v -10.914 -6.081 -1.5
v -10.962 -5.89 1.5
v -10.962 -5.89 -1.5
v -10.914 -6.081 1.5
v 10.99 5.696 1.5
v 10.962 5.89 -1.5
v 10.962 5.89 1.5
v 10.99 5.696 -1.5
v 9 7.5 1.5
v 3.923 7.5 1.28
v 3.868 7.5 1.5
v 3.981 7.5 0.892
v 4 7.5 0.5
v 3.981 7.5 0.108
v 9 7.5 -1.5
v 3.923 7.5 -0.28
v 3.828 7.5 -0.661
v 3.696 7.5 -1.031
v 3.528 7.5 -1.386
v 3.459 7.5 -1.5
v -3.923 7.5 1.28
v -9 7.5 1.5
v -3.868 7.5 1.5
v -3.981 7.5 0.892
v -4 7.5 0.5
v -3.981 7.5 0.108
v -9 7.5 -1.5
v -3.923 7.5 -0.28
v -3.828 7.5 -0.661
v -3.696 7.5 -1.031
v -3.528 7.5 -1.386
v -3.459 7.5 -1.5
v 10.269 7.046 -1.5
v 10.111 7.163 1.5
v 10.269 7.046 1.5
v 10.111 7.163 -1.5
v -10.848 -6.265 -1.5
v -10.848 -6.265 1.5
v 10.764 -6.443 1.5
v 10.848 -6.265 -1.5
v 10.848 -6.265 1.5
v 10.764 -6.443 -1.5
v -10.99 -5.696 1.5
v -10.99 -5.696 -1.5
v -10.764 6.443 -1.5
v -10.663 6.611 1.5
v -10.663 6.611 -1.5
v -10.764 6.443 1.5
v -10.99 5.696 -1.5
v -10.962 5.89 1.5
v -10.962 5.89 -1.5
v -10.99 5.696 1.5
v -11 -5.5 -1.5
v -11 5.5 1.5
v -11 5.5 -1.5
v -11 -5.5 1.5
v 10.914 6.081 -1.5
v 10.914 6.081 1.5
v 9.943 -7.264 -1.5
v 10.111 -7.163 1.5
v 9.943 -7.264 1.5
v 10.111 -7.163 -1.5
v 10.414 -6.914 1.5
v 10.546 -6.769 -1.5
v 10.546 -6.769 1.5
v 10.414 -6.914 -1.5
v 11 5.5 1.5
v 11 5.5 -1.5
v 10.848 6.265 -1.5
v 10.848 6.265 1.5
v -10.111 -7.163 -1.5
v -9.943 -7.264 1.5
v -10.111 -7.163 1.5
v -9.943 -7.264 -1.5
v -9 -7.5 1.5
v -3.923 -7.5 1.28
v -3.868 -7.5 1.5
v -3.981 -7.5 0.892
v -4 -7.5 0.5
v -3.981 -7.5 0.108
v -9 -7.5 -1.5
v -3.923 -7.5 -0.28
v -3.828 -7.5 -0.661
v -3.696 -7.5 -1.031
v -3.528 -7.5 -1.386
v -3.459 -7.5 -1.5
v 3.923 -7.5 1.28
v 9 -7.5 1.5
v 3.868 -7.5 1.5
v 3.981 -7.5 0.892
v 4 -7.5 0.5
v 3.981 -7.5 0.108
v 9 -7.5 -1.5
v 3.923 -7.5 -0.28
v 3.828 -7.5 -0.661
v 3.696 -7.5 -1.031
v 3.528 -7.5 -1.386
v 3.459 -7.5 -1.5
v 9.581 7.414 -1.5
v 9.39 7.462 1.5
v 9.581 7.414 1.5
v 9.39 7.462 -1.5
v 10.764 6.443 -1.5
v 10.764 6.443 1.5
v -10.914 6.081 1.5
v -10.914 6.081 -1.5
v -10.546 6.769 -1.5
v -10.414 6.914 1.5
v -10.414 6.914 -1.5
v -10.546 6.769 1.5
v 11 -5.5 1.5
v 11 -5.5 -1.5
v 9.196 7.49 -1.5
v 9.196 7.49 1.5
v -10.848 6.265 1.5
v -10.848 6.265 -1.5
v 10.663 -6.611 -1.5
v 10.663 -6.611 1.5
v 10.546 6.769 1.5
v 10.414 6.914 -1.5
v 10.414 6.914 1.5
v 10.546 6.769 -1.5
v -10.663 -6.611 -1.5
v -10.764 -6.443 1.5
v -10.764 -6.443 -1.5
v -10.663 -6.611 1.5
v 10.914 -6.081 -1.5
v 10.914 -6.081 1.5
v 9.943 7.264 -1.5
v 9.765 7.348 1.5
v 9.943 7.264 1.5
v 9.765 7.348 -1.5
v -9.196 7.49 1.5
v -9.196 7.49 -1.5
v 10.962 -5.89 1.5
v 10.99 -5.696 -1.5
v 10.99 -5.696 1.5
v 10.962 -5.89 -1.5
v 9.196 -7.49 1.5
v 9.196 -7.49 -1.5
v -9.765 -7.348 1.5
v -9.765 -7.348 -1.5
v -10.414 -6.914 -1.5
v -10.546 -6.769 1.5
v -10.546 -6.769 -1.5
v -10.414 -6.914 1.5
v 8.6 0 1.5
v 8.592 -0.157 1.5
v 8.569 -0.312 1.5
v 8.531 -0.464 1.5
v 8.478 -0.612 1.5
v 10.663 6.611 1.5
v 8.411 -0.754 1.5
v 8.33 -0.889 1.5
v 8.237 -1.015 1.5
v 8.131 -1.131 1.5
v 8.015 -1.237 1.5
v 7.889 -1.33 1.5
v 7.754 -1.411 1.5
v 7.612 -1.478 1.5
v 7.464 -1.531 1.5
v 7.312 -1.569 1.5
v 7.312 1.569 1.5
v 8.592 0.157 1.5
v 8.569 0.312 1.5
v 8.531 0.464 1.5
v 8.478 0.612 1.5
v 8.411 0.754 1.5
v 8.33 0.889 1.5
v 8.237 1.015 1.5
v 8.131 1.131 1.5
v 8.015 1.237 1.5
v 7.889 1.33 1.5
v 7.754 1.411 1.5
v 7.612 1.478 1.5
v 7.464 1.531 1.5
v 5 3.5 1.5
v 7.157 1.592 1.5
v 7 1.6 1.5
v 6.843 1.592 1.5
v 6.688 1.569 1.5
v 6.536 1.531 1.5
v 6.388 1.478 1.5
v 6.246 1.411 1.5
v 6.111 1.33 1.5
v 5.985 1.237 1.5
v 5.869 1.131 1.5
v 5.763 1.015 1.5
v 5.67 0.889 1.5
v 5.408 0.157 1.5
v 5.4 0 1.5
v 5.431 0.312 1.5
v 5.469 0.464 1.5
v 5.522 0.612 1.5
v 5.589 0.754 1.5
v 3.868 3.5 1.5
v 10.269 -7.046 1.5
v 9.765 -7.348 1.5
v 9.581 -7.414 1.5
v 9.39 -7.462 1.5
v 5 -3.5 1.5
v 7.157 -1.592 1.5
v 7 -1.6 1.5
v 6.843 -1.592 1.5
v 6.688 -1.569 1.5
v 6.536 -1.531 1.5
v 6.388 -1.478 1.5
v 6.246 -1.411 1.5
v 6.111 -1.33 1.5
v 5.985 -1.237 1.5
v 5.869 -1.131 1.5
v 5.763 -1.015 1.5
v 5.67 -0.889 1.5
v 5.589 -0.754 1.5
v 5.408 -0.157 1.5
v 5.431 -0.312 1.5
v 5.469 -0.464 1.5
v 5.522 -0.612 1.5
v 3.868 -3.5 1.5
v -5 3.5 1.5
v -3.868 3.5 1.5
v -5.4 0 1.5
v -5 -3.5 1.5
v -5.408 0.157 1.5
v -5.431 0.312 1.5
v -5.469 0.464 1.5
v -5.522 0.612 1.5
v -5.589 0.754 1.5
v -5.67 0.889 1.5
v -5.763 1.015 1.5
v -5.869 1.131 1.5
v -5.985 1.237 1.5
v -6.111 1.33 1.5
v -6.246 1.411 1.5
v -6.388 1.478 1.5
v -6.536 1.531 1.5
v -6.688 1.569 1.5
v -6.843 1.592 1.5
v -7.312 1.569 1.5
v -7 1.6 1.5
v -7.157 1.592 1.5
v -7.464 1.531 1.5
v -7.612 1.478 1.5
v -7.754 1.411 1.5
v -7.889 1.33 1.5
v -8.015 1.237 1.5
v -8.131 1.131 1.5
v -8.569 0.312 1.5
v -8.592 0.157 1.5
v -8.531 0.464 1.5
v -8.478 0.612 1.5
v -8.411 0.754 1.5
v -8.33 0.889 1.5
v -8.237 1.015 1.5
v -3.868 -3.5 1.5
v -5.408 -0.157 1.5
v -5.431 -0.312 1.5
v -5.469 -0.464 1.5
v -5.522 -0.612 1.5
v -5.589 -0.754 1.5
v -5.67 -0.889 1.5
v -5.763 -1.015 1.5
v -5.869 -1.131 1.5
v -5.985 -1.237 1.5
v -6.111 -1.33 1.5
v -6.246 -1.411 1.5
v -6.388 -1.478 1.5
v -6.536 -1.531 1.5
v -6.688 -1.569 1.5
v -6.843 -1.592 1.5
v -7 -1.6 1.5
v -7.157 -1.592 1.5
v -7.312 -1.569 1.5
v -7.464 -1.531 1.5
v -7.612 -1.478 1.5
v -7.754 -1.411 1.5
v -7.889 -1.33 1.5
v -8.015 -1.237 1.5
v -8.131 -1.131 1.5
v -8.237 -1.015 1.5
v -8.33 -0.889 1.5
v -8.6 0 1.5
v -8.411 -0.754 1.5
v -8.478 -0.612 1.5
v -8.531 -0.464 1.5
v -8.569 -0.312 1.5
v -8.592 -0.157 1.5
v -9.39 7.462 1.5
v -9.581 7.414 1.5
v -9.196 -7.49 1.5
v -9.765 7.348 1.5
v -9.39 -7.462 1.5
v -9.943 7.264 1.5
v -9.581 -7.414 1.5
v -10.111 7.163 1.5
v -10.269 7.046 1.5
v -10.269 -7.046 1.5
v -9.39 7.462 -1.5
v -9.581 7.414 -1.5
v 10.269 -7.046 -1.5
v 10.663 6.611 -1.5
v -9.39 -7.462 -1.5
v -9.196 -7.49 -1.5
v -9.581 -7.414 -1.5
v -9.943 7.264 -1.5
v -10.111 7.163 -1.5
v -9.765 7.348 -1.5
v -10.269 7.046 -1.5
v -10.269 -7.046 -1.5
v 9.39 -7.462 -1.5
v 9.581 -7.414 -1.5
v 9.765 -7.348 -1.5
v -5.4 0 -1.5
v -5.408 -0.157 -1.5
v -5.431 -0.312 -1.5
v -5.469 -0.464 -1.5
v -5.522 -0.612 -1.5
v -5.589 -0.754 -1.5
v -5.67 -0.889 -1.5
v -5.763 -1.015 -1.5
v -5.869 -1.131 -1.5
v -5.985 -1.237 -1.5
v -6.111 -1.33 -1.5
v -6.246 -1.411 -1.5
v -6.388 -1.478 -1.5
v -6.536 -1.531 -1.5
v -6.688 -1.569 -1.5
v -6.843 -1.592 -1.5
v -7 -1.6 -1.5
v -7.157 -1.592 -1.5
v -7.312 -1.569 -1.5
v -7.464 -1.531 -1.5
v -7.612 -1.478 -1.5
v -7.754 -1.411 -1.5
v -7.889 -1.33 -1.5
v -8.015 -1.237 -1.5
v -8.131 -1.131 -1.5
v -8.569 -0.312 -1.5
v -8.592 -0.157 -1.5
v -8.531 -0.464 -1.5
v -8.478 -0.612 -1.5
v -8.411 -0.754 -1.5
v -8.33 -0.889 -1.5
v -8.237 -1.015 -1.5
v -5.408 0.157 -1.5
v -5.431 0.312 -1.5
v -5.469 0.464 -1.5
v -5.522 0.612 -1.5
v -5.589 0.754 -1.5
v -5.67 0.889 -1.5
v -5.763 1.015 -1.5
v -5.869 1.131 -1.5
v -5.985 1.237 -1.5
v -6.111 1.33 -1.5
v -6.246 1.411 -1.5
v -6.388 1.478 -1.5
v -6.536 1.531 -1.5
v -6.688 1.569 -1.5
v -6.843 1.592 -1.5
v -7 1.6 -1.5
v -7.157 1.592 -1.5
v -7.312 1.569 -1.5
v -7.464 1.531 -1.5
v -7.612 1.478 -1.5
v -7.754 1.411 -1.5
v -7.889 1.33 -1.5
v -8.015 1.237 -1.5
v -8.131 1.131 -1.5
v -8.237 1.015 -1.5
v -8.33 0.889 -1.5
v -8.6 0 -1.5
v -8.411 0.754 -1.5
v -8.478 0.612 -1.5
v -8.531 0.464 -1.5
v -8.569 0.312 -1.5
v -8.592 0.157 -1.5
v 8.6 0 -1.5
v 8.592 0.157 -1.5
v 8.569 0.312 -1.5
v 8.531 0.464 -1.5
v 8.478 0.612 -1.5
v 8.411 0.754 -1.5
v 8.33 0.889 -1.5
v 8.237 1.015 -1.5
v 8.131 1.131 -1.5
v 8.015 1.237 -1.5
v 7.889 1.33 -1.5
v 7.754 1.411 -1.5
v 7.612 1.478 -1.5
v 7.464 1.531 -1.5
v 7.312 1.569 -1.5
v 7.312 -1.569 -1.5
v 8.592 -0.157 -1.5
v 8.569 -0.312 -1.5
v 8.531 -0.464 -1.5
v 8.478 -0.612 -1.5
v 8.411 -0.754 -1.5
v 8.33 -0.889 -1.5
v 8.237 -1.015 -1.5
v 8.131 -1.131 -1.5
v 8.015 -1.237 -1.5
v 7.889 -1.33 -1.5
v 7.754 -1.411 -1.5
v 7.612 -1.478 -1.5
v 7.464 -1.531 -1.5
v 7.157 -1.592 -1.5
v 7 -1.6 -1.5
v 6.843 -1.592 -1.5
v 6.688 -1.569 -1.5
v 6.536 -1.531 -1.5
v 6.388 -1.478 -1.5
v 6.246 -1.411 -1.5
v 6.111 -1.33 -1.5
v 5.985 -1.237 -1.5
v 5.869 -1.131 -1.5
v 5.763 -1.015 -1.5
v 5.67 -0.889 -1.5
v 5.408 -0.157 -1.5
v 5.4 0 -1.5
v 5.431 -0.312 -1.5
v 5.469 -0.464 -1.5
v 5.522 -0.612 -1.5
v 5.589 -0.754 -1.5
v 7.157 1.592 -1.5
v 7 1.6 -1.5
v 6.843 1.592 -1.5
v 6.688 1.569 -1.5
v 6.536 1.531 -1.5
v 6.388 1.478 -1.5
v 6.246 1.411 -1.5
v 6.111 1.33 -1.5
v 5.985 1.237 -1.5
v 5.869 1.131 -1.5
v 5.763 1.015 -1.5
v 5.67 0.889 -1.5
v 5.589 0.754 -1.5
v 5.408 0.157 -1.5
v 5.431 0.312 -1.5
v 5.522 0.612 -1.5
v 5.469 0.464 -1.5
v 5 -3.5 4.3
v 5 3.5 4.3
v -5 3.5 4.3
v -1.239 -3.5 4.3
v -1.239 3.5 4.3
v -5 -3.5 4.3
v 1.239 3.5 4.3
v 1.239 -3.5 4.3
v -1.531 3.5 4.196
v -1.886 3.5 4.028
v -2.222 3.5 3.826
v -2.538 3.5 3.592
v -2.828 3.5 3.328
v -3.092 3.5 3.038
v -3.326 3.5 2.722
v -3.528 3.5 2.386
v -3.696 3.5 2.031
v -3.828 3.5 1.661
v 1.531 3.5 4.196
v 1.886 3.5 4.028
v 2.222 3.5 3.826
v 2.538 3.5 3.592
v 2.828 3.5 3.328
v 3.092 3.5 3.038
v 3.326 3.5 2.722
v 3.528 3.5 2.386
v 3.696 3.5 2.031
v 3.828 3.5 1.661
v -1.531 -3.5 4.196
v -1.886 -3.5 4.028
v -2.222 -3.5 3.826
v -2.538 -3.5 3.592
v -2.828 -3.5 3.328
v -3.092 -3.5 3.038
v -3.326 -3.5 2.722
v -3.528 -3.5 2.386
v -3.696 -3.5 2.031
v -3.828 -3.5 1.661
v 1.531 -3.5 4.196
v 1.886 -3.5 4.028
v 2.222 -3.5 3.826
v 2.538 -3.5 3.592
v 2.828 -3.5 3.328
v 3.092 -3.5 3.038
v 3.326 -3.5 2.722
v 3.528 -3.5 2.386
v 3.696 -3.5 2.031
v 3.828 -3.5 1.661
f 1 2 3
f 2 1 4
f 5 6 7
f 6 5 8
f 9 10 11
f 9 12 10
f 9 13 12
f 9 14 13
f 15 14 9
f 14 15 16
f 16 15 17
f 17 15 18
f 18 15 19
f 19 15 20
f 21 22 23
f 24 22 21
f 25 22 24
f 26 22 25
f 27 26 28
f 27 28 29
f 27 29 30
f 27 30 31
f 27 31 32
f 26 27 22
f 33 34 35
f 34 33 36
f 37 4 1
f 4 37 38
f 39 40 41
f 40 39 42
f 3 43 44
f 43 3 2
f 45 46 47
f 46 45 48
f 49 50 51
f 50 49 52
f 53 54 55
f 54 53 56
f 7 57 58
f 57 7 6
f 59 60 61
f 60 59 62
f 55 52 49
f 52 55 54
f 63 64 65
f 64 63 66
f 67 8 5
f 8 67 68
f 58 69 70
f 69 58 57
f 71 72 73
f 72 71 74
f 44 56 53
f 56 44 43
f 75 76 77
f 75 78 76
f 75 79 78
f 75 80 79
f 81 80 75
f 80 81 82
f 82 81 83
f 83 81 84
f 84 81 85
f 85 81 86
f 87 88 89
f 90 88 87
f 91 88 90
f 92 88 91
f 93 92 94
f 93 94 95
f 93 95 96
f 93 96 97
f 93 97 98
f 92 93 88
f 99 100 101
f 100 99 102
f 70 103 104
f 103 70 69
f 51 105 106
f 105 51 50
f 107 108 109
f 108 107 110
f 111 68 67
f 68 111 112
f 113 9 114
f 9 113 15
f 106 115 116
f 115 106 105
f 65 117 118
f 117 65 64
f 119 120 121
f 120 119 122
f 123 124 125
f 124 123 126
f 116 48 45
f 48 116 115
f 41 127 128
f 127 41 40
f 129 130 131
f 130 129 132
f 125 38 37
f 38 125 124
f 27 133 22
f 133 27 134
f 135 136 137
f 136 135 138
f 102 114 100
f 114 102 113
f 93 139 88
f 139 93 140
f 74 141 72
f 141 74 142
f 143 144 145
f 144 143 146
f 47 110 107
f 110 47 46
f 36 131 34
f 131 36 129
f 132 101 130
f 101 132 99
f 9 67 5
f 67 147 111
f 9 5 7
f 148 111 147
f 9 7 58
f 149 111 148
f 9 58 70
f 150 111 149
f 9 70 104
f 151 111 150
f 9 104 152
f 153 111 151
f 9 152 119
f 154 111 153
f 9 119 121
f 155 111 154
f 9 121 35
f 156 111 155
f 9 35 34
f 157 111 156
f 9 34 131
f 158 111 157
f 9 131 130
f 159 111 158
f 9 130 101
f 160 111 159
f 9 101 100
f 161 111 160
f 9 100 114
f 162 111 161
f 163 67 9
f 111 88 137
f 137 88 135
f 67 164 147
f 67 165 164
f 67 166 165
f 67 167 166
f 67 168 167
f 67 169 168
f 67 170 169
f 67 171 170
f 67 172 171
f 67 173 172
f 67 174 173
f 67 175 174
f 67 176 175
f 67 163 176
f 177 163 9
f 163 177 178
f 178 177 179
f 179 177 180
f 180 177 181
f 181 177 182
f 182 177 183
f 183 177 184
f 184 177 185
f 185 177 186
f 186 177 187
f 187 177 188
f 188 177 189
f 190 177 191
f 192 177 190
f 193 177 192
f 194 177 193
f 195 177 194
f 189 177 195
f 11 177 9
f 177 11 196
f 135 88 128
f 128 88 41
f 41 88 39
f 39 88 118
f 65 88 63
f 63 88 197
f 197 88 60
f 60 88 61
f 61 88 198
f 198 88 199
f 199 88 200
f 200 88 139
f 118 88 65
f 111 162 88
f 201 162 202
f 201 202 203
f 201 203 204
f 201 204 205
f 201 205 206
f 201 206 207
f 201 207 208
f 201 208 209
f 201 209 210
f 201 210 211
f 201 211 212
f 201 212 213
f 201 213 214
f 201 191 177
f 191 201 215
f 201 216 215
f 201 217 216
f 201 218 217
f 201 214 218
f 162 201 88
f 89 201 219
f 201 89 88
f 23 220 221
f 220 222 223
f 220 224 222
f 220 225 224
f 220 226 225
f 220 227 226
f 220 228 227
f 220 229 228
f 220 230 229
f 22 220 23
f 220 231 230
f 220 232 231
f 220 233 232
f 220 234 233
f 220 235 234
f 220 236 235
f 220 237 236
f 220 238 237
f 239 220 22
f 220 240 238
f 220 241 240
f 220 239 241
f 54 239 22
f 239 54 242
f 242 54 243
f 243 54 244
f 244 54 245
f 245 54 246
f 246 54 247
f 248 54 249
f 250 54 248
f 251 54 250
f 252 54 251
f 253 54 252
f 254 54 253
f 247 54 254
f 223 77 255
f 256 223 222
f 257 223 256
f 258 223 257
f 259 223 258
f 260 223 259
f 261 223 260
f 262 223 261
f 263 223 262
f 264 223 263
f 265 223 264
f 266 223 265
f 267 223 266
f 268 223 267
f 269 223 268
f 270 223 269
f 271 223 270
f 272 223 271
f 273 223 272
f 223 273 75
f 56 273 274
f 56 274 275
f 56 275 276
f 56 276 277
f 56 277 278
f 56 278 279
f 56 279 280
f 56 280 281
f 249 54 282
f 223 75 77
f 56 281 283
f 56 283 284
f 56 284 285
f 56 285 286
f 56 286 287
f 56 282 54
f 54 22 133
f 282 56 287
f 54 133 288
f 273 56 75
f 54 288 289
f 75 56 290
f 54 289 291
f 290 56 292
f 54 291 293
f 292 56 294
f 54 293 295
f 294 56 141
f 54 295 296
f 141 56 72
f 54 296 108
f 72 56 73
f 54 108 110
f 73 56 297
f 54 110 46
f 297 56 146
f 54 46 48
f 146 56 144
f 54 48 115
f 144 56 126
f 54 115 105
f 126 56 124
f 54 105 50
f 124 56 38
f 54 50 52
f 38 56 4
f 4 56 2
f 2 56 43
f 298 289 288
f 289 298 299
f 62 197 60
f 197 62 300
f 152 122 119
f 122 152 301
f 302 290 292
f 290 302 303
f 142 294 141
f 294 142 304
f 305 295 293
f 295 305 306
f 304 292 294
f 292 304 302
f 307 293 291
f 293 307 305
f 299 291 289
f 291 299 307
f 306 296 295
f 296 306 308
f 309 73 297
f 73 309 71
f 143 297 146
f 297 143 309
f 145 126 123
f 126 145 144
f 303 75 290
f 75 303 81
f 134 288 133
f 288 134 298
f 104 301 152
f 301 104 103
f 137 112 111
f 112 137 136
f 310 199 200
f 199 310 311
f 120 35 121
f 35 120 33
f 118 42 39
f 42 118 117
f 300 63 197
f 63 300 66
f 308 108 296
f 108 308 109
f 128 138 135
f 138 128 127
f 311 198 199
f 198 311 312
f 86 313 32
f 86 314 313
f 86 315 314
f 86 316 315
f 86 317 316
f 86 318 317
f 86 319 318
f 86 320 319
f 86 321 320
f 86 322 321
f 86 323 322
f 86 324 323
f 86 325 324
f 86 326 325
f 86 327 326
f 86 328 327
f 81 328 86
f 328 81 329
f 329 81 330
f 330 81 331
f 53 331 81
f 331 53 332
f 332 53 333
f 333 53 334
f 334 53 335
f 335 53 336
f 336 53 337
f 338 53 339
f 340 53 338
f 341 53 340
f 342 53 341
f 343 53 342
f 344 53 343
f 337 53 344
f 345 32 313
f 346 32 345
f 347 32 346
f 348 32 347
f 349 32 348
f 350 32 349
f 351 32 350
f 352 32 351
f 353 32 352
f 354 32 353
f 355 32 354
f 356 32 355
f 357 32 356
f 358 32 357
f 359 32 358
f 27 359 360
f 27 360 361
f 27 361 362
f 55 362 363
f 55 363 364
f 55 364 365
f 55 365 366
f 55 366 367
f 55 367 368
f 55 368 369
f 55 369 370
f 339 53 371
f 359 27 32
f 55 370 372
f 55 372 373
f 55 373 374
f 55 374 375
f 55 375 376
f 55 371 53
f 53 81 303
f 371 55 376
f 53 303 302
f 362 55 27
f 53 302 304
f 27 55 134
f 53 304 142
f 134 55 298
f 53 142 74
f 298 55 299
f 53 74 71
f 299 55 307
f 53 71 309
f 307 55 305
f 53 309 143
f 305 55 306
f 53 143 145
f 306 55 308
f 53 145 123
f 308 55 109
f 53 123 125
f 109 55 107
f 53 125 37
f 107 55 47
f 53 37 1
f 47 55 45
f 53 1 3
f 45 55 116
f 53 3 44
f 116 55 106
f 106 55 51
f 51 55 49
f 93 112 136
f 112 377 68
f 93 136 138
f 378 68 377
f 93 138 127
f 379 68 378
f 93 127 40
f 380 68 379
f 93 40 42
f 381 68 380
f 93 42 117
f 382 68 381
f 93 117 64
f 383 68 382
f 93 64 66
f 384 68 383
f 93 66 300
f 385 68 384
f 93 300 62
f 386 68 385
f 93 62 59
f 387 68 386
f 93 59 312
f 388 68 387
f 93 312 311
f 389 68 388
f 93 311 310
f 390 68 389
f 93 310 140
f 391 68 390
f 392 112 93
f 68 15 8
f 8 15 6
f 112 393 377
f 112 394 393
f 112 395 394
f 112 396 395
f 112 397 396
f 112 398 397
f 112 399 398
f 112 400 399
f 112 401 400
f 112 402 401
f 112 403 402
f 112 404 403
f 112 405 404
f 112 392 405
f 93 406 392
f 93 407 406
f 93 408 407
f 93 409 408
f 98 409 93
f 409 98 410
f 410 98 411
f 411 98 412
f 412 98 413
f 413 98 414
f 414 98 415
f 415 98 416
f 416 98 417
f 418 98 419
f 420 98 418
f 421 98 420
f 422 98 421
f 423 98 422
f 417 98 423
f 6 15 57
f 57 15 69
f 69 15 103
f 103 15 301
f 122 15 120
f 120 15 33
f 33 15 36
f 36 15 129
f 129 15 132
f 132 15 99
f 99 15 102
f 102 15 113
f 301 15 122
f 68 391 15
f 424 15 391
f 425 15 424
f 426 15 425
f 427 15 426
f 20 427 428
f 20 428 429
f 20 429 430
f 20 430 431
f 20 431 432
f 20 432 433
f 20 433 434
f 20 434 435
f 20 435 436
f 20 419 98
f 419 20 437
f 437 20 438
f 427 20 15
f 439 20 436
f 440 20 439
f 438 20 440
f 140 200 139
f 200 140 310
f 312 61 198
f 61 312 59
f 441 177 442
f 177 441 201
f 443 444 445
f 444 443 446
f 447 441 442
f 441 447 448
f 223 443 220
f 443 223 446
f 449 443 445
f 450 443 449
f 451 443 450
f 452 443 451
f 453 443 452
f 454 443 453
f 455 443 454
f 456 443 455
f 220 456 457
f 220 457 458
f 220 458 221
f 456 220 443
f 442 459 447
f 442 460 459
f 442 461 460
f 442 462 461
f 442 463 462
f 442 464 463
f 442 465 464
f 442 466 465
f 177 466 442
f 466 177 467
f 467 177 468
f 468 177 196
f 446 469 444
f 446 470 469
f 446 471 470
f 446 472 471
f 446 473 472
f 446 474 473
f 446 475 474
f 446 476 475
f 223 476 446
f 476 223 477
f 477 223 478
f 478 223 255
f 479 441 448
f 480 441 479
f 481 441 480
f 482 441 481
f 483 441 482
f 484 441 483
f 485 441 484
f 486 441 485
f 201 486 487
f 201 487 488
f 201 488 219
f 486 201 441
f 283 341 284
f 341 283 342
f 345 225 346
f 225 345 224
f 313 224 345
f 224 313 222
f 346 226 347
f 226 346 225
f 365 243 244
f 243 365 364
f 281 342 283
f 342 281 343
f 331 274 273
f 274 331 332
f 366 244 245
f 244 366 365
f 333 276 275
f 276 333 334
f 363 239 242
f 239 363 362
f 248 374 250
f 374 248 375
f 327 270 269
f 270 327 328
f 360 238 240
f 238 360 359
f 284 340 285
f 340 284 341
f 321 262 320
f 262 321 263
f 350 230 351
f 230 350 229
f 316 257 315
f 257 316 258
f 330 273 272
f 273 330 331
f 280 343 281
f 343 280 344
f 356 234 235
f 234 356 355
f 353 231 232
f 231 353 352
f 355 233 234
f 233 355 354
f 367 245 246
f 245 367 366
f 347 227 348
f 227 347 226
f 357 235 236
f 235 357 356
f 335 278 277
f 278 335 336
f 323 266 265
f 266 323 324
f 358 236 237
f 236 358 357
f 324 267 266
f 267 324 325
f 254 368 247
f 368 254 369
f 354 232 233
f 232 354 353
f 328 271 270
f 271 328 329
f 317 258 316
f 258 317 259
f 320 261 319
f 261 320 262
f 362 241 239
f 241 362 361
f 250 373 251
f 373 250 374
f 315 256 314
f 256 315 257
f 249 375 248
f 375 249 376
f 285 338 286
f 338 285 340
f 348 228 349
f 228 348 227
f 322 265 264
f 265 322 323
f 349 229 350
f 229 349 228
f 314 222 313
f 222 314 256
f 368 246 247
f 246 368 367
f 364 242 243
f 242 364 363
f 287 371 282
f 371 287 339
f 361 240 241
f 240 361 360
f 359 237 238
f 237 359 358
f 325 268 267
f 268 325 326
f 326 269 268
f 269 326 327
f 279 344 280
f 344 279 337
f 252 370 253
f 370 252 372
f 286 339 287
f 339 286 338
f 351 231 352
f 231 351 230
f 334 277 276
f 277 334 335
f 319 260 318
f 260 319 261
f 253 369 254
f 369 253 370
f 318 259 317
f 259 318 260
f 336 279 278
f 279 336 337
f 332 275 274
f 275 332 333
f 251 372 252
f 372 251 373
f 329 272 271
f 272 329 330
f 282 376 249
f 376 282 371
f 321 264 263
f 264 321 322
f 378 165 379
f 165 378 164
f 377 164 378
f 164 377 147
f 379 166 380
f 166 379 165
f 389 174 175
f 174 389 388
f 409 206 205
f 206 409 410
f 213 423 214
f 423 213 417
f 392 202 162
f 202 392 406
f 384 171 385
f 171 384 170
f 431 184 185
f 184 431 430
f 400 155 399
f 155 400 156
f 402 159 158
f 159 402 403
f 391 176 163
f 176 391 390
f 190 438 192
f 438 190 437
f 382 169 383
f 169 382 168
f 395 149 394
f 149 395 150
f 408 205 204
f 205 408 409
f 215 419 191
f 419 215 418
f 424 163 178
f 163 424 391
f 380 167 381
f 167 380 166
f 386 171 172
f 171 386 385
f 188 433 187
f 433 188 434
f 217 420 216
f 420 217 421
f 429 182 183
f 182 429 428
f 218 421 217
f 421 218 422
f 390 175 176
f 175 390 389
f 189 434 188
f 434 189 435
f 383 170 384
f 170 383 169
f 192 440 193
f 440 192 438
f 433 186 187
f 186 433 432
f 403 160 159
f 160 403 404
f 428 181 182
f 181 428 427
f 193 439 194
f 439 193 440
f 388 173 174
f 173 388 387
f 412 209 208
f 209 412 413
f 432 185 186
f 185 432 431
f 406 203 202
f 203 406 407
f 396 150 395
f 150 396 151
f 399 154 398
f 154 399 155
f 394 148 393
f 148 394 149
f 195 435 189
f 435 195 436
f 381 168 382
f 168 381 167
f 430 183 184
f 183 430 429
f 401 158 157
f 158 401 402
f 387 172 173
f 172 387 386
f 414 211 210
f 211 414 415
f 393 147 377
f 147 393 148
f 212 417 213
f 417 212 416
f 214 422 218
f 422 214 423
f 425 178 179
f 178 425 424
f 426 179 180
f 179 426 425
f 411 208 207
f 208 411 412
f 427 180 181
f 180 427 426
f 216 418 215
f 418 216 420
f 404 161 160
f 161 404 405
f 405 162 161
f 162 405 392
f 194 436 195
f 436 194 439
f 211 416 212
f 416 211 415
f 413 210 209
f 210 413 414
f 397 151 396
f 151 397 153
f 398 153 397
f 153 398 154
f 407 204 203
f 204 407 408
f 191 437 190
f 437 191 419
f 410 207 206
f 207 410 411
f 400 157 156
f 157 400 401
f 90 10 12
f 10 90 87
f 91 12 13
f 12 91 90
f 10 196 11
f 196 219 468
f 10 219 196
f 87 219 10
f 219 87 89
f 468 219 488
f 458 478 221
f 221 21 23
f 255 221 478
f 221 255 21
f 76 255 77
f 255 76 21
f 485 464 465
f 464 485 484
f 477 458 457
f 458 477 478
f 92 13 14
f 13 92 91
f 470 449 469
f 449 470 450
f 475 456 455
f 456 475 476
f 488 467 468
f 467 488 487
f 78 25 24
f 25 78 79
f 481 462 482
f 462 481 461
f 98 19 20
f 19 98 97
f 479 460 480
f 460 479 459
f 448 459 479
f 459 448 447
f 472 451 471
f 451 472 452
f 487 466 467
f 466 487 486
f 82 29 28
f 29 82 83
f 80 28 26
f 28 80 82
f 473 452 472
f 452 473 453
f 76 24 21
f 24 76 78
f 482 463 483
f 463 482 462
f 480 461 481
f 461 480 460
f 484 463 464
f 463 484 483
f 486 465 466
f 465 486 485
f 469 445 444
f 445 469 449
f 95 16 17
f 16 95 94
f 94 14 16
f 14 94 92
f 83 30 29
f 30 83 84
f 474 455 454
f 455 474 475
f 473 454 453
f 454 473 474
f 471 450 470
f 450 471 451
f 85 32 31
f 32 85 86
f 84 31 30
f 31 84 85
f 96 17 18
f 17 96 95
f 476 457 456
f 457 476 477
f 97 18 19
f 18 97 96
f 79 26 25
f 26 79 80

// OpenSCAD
$fn = 64;

// Bounding box target: 22 x 15 x 6 mm
L = 22.0;
W = 15.0;
H = 6.0;

// Base plate
plate_t  = 3.0;
corner_r = 2.0;

// Through holes (symmetric near ends)
hole_d     = 3.2;
hole_x_off = 7.0;
hole_y_off = 0.0;

// Center boss (on +Z face)
boss_L = 10.0;
boss_W = 7.0;
boss_H = 3.0;

// U-seat cutout (on -Z face)
u_r     = 4.0;
u_depth = 2.0;

// Small overlap to ensure watertight boolean ops
overlap = 0.2;

// 2D rounded rectangle (for clean rounded outer corners)
module rounded_rect_2d(l, w, r) {
  r2 = min(r, min(l, w)/2);
  hull() {
    for (sx = [-1, 1], sy = [-1, 1])
      translate([sx*(l/2 - r2), sy*(w/2 - r2)])
        circle(r = r2);
  }
}

module base_plate() {
  linear_extrude(height = plate_t, center = true)
    rounded_rect_2d(L, W, corner_r);
}

module boss() {
  // Boss sits on top face of plate: plate top at +plate_t/2
  translate([0, 0, plate_t/2 + boss_H/2 - overlap])
    cube([boss_L, boss_W, boss_H], center = true);
}

module through_holes() {
  for (sx = [-1, 1])
    translate([sx*hole_x_off, hole_y_off, 0])
      cylinder(d = hole_d, h = H + 2*overlap, center = true);
}

module u_seat_cutout() {
  // Create a semicylindrical (U-shaped) cut from the bottom face.
  // Cylinder axis along Y; only the portion that reaches into the plate by u_depth is removed.
  // Bottom face of plate is at z = -plate_t/2, so cylinder center is placed at:
  // zc = (-plate_t/2) + u_r - u_depth
  zc = -plate_t/2 + u_r - u_depth;

  translate([0, 0, zc])
    rotate([90, 0, 0])
      cylinder(r = u_r, h = W + 2*overlap, center = true);
}

difference() {
  union() {
    base_plate();
    boss();
  }
  through_holes();
  u_seat_cutout();
}
